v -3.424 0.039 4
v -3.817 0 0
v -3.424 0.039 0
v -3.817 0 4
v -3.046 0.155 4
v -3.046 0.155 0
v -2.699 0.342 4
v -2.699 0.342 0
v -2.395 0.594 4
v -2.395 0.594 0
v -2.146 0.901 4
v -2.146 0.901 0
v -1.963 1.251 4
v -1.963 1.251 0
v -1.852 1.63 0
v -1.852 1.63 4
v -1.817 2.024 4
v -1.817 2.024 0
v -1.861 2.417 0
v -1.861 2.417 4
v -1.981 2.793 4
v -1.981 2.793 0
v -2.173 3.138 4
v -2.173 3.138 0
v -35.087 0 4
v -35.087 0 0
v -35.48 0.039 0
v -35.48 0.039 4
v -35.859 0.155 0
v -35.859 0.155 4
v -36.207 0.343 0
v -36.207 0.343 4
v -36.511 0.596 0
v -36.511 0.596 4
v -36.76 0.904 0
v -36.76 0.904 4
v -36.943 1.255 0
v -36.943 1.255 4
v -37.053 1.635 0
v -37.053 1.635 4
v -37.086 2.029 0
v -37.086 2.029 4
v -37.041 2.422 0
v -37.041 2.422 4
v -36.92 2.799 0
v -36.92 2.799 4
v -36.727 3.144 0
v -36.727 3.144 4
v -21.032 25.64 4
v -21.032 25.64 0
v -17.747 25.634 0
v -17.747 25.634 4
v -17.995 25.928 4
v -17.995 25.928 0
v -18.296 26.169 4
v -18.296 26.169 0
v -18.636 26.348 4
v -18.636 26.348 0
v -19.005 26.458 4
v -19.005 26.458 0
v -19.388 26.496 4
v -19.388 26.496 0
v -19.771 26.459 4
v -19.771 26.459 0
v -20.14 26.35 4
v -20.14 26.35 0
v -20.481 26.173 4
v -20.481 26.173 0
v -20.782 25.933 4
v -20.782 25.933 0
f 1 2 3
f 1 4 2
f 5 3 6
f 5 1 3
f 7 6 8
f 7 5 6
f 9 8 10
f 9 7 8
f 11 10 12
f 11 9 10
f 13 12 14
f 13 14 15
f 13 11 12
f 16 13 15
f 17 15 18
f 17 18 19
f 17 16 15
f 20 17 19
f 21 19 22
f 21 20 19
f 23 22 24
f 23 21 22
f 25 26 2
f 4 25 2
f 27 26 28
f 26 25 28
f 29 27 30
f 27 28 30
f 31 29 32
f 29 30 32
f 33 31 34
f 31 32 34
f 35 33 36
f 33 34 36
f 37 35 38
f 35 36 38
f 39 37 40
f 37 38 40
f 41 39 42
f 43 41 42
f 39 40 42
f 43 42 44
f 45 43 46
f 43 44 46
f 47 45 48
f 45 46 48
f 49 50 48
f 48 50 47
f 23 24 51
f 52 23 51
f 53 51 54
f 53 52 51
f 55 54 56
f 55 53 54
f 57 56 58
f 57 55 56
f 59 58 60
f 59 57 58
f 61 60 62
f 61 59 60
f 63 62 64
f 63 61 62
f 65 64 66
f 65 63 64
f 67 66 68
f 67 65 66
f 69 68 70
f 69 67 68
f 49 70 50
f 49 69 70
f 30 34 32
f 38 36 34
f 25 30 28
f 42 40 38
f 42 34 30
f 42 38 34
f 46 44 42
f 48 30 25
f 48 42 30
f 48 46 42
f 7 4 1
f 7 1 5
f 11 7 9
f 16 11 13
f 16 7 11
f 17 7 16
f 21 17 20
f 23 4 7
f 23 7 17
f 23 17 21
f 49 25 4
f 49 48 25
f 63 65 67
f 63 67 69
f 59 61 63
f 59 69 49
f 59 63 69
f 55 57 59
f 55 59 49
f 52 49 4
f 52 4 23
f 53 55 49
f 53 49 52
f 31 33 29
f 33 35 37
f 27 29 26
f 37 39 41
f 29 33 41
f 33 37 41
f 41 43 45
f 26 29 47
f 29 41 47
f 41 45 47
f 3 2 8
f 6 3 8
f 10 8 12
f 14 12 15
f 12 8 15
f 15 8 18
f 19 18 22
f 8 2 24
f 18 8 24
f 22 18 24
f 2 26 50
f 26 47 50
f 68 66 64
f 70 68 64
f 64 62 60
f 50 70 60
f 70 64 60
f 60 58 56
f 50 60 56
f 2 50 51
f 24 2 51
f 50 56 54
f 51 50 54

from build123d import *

# Parameters (mm, degrees)
F1_DEPTH = 4
F2_R     = 2


with BuildPart() as f1:
    # F0 (on Top) → F1 (new body)
    with BuildSketch(Plane.XY):
        Polygon((-38.920617, 0), (0, 0), (-19.38504, 28), align=None)
    extrude(amount=F1_DEPTH)

    # F2
    f2_edges = [f1.edges().sort_by_distance(p)[0] for p in [
        (-19.38504, 28, 2),
        (-38.920617, 0, 2),
        (0, 0, 2),
    ]]
    fillet(f2_edges, radius=F2_R)


solid = f1.part
